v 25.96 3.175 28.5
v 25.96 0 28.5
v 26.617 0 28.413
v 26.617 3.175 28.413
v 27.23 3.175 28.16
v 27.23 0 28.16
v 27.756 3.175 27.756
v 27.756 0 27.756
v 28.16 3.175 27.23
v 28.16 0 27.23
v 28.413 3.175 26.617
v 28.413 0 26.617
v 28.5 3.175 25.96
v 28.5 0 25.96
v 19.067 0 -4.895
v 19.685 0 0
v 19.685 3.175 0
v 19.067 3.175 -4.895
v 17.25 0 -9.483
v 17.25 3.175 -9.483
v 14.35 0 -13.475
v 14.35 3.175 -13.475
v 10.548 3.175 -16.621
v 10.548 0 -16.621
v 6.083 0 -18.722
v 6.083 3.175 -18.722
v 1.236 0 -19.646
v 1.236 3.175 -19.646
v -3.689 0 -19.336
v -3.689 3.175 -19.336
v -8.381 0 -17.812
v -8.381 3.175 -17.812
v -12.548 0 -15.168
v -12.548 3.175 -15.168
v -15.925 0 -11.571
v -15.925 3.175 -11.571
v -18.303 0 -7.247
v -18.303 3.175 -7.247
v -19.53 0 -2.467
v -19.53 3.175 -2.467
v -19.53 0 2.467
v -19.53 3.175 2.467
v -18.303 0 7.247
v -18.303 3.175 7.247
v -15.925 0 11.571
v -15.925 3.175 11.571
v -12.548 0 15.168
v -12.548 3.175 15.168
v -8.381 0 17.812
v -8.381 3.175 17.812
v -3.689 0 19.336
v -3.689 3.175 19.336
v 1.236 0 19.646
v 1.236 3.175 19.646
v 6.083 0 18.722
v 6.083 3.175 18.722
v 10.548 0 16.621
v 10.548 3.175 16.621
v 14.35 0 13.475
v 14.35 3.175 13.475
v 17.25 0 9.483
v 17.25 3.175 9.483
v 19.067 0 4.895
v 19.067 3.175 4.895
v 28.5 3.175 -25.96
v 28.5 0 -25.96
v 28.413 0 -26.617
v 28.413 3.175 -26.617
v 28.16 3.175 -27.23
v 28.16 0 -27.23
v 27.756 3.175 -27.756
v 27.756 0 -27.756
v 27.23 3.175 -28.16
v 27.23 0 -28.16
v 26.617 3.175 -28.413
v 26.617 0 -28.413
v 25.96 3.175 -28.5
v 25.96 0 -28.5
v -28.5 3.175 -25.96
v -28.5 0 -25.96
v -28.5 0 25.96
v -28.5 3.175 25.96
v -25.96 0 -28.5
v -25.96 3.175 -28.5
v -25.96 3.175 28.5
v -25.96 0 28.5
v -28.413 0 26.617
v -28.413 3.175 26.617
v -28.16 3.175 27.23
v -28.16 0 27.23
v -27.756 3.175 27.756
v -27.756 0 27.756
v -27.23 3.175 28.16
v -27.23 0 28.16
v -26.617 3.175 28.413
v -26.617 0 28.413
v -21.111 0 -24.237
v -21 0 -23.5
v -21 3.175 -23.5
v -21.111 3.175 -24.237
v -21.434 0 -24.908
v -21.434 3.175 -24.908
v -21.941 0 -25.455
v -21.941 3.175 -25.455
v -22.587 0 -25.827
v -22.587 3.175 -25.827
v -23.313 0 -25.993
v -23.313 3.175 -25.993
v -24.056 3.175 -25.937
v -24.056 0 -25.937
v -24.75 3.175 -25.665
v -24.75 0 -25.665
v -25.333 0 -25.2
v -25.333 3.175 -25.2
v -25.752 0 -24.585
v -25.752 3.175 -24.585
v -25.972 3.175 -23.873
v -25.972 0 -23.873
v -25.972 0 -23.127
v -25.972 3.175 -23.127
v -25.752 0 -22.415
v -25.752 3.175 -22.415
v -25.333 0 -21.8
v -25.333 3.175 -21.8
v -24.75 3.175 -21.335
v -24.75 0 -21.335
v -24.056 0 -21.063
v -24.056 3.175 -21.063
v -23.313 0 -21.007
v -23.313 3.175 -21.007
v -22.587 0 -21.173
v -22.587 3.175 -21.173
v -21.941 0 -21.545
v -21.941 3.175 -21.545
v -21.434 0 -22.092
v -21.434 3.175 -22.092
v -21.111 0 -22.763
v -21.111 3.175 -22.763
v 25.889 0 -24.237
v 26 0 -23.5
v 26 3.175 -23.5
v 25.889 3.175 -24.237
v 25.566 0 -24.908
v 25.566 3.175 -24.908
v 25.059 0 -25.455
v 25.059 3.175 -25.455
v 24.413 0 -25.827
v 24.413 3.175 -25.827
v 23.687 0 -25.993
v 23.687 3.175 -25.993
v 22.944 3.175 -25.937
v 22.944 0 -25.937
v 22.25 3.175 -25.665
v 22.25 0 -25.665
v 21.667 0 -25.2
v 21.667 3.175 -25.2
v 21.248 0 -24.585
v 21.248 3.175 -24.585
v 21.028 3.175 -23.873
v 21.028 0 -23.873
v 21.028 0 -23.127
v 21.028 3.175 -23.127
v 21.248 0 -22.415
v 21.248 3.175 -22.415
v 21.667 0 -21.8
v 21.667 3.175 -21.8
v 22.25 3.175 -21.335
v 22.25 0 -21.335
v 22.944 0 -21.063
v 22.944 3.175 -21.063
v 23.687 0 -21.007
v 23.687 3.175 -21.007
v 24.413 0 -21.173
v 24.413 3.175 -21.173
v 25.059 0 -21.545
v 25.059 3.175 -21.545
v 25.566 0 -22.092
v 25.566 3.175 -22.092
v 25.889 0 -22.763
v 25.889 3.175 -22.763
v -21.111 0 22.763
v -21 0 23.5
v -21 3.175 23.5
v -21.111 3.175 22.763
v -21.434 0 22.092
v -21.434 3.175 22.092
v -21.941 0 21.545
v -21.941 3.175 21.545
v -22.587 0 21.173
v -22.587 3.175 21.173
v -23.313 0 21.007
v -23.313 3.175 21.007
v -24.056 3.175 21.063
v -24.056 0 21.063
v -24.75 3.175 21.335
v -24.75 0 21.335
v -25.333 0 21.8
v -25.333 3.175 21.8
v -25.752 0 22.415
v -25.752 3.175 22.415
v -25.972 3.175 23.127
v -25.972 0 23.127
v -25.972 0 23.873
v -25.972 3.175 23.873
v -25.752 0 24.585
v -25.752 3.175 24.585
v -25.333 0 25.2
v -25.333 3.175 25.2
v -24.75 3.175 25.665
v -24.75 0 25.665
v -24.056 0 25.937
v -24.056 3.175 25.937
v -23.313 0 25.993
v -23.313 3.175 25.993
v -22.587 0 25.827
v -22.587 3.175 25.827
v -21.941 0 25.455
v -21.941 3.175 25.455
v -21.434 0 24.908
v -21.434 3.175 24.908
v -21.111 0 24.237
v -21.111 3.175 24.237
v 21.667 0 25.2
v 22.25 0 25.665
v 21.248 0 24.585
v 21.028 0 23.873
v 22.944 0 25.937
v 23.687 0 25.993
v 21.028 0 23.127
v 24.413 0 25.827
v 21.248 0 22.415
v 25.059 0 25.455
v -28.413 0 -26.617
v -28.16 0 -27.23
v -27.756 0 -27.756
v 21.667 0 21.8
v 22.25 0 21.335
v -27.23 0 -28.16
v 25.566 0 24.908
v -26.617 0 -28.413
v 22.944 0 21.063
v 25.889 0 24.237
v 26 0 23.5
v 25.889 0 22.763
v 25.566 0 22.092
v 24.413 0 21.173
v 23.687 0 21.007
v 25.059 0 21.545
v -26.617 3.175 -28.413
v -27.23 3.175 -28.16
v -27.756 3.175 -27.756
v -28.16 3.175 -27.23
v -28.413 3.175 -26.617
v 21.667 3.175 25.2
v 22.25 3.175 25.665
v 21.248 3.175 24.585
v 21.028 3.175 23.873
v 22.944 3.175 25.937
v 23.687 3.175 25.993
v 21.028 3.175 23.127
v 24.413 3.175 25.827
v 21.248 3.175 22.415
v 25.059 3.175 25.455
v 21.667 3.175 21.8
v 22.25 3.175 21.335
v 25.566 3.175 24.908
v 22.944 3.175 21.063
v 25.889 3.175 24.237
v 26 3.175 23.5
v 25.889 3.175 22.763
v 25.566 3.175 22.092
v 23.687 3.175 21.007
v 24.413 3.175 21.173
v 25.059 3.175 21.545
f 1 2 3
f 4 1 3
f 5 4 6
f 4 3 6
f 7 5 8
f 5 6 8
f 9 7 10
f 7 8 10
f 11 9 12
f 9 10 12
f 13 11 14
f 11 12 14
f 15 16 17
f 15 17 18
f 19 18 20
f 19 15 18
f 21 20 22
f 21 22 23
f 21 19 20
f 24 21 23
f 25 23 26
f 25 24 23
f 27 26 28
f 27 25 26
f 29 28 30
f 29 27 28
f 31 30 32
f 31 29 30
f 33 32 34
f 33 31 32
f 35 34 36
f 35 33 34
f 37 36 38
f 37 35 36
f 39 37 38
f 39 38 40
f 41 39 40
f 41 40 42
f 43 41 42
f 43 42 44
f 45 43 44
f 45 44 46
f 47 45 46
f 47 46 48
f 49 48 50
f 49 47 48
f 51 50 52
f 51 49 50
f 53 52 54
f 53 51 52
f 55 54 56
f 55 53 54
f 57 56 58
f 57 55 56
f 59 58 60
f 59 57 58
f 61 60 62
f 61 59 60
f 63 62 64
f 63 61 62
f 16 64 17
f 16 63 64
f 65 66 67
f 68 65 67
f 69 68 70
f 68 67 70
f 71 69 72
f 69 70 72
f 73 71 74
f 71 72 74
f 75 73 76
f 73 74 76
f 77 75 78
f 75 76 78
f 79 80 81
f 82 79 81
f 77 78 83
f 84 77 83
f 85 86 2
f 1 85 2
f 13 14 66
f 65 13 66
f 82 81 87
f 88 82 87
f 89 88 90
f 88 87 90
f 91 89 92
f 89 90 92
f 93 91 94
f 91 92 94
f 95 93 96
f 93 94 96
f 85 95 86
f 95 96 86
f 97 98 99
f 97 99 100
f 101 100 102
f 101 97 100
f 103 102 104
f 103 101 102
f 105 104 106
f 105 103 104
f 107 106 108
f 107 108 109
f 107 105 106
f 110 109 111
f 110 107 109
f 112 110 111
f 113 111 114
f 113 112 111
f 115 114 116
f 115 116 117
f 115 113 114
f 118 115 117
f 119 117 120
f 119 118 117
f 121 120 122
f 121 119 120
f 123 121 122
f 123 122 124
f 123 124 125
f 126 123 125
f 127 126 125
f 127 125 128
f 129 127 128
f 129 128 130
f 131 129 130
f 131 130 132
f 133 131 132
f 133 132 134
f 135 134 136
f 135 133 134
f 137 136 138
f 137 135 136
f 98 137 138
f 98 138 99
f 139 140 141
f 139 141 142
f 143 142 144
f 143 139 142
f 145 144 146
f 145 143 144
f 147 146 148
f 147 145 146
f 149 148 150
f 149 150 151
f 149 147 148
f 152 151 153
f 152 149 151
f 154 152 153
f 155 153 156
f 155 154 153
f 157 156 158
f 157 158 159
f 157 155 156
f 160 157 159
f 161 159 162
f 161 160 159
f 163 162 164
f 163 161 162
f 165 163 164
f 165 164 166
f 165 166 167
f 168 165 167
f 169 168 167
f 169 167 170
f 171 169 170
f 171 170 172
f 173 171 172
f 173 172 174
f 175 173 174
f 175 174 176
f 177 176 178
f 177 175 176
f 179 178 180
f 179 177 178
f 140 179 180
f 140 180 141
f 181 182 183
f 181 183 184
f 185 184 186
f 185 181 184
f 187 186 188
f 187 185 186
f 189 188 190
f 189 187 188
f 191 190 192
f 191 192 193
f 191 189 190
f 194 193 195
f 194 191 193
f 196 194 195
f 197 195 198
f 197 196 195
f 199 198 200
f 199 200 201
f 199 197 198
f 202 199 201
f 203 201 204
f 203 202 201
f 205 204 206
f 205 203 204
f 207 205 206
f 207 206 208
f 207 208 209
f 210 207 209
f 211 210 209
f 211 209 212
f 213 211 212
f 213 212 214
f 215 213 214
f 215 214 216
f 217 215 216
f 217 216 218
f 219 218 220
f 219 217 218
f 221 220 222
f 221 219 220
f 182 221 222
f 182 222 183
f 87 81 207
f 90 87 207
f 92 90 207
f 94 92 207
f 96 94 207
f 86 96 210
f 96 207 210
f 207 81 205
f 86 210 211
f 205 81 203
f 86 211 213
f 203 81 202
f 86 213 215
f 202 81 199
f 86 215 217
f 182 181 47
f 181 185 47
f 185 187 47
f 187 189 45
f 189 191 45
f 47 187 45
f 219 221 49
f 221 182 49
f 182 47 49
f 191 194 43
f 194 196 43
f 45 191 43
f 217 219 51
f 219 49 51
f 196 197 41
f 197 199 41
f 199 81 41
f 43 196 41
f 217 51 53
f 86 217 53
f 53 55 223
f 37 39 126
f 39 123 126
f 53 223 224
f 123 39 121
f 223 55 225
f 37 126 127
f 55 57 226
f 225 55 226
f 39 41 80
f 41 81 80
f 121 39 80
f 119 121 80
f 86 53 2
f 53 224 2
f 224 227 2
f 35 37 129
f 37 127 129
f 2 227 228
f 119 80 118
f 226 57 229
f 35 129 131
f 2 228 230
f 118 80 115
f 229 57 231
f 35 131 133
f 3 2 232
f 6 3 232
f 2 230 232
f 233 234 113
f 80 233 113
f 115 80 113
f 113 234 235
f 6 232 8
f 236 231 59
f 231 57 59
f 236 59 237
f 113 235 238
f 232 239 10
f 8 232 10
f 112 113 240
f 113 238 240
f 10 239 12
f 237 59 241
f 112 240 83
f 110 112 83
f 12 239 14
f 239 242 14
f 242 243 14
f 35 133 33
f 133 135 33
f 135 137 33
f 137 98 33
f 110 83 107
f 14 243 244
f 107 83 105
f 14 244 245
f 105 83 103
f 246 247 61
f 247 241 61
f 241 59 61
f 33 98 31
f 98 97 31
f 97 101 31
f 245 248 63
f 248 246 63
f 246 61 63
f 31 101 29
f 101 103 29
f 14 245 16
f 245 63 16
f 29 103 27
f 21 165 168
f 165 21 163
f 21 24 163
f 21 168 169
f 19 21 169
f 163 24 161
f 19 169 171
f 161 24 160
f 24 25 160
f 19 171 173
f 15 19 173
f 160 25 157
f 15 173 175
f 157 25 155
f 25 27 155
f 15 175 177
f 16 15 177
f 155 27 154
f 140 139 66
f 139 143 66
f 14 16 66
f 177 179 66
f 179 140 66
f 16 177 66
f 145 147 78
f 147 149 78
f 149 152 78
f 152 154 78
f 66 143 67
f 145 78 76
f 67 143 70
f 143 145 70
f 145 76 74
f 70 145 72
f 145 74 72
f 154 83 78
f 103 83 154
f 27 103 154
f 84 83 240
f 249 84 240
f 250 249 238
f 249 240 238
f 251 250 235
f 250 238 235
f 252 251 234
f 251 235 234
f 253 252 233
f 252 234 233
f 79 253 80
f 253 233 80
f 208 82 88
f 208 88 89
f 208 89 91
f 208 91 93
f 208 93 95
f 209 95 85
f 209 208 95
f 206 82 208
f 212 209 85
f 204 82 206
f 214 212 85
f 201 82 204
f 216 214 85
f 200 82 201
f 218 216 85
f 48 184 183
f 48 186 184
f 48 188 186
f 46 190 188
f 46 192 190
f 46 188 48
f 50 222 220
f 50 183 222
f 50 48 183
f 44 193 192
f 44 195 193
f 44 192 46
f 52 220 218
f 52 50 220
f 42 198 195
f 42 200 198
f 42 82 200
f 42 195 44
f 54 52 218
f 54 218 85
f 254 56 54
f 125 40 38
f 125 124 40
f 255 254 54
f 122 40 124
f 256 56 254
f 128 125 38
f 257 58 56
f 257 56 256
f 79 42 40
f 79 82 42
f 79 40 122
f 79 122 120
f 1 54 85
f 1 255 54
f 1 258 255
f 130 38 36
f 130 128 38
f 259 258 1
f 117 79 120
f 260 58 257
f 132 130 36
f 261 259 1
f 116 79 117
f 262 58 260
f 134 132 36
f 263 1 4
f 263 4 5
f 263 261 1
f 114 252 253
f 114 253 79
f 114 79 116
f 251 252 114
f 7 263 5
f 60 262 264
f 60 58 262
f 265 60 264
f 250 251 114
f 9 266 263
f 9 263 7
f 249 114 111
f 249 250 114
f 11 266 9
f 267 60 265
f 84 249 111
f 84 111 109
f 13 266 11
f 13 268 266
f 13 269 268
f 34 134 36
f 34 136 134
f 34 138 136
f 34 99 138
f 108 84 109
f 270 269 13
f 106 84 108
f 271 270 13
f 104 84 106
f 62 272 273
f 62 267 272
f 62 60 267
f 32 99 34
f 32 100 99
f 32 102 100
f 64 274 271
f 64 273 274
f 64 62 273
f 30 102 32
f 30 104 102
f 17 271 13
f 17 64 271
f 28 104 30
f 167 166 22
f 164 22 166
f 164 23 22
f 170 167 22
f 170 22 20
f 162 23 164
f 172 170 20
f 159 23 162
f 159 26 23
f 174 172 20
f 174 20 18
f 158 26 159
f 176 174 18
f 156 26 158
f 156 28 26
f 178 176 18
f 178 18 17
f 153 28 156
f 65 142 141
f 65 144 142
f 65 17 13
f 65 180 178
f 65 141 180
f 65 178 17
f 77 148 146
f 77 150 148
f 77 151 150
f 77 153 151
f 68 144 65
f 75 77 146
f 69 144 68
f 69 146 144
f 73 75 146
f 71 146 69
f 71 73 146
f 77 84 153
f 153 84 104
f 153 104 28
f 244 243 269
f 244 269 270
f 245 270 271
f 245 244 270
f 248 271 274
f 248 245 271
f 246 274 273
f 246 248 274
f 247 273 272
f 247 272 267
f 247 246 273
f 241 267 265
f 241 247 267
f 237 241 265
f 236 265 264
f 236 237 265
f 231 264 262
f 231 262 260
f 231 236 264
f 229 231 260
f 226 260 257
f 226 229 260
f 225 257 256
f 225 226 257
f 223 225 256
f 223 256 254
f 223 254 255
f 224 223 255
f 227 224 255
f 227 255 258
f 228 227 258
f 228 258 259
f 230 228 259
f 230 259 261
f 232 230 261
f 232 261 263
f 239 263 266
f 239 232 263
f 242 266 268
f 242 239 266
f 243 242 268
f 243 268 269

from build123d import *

# Parameters (mm, degrees)
SKETCH1_R           = 19.685
SKETCH1_R_2         = 2.499995
BOSS_EXTRUDE1_DEPTH = 3.175


with BuildPart() as part:
    # Sketch1 → Boss-Extrude1 (new body)
    with BuildSketch(Plane(origin=(0, 0, 0), x_dir=(1, 0, 0), z_dir=(0, 1, 0))):
        with BuildLine():
            Line((-13.993314597, 28.4999938), (-25.9599938, 28.4999938))
            ThreePointArc((-25.9599938, 28.4999938), (-27.756045024, 27.756045024), (-28.4999938, 25.9599938))
            Line((-28.4999938, 25.9599938), (-28.4999938, 13.993314597))
            Line((-28.4999938, 13.993314597), (-28.4999938, -13.993314597))
            Line((-28.4999938, -13.993314597), (-28.4999938, -25.9599938))
            ThreePointArc((-28.4999938, -25.9599938), (-27.756045024, -27.756045024), (-25.9599938, -28.4999938))
            Line((-25.9599938, -28.4999938), (-13.993314597, -28.4999938))
            Line((-13.993314597, -28.4999938), (13.993314597, -28.4999938))
            Line((13.993314597, -28.4999938), (25.9599938, -28.4999938))
            ThreePointArc((25.9599938, -28.4999938), (27.756045024, -27.756045024), (28.4999938, -25.9599938))
            Line((28.4999938, -25.9599938), (28.4999938, -13.993314597))
            Line((28.4999938, -13.993314597), (28.4999938, 13.993314597))
            Line((28.4999938, 13.993314597), (28.4999938, 25.9599938))
            ThreePointArc((28.4999938, 25.9599938), (27.756045024, 27.756045024), (25.9599938, 28.4999938))
            Line((25.9599938, 28.4999938), (13.993314597, 28.4999938))
            Line((13.993314597, 28.4999938), (-13.993314597, 28.4999938))
        make_face()
        Circle(SKETCH1_R, mode=Mode.SUBTRACT)
        with Locations((-23.5000038, 23.5000038)):
            Circle(SKETCH1_R_2, mode=Mode.SUBTRACT)
        with Locations((23.5000038, 23.5000038)):
            Circle(SKETCH1_R_2, mode=Mode.SUBTRACT)
        with Locations((23.5000038, -23.5000038)):
            Circle(SKETCH1_R_2, mode=Mode.SUBTRACT)
        with Locations((-23.5000038, -23.5000038)):
            Circle(SKETCH1_R_2, mode=Mode.SUBTRACT)
    extrude(amount=BOSS_EXTRUDE1_DEPTH)


solid = part.part
